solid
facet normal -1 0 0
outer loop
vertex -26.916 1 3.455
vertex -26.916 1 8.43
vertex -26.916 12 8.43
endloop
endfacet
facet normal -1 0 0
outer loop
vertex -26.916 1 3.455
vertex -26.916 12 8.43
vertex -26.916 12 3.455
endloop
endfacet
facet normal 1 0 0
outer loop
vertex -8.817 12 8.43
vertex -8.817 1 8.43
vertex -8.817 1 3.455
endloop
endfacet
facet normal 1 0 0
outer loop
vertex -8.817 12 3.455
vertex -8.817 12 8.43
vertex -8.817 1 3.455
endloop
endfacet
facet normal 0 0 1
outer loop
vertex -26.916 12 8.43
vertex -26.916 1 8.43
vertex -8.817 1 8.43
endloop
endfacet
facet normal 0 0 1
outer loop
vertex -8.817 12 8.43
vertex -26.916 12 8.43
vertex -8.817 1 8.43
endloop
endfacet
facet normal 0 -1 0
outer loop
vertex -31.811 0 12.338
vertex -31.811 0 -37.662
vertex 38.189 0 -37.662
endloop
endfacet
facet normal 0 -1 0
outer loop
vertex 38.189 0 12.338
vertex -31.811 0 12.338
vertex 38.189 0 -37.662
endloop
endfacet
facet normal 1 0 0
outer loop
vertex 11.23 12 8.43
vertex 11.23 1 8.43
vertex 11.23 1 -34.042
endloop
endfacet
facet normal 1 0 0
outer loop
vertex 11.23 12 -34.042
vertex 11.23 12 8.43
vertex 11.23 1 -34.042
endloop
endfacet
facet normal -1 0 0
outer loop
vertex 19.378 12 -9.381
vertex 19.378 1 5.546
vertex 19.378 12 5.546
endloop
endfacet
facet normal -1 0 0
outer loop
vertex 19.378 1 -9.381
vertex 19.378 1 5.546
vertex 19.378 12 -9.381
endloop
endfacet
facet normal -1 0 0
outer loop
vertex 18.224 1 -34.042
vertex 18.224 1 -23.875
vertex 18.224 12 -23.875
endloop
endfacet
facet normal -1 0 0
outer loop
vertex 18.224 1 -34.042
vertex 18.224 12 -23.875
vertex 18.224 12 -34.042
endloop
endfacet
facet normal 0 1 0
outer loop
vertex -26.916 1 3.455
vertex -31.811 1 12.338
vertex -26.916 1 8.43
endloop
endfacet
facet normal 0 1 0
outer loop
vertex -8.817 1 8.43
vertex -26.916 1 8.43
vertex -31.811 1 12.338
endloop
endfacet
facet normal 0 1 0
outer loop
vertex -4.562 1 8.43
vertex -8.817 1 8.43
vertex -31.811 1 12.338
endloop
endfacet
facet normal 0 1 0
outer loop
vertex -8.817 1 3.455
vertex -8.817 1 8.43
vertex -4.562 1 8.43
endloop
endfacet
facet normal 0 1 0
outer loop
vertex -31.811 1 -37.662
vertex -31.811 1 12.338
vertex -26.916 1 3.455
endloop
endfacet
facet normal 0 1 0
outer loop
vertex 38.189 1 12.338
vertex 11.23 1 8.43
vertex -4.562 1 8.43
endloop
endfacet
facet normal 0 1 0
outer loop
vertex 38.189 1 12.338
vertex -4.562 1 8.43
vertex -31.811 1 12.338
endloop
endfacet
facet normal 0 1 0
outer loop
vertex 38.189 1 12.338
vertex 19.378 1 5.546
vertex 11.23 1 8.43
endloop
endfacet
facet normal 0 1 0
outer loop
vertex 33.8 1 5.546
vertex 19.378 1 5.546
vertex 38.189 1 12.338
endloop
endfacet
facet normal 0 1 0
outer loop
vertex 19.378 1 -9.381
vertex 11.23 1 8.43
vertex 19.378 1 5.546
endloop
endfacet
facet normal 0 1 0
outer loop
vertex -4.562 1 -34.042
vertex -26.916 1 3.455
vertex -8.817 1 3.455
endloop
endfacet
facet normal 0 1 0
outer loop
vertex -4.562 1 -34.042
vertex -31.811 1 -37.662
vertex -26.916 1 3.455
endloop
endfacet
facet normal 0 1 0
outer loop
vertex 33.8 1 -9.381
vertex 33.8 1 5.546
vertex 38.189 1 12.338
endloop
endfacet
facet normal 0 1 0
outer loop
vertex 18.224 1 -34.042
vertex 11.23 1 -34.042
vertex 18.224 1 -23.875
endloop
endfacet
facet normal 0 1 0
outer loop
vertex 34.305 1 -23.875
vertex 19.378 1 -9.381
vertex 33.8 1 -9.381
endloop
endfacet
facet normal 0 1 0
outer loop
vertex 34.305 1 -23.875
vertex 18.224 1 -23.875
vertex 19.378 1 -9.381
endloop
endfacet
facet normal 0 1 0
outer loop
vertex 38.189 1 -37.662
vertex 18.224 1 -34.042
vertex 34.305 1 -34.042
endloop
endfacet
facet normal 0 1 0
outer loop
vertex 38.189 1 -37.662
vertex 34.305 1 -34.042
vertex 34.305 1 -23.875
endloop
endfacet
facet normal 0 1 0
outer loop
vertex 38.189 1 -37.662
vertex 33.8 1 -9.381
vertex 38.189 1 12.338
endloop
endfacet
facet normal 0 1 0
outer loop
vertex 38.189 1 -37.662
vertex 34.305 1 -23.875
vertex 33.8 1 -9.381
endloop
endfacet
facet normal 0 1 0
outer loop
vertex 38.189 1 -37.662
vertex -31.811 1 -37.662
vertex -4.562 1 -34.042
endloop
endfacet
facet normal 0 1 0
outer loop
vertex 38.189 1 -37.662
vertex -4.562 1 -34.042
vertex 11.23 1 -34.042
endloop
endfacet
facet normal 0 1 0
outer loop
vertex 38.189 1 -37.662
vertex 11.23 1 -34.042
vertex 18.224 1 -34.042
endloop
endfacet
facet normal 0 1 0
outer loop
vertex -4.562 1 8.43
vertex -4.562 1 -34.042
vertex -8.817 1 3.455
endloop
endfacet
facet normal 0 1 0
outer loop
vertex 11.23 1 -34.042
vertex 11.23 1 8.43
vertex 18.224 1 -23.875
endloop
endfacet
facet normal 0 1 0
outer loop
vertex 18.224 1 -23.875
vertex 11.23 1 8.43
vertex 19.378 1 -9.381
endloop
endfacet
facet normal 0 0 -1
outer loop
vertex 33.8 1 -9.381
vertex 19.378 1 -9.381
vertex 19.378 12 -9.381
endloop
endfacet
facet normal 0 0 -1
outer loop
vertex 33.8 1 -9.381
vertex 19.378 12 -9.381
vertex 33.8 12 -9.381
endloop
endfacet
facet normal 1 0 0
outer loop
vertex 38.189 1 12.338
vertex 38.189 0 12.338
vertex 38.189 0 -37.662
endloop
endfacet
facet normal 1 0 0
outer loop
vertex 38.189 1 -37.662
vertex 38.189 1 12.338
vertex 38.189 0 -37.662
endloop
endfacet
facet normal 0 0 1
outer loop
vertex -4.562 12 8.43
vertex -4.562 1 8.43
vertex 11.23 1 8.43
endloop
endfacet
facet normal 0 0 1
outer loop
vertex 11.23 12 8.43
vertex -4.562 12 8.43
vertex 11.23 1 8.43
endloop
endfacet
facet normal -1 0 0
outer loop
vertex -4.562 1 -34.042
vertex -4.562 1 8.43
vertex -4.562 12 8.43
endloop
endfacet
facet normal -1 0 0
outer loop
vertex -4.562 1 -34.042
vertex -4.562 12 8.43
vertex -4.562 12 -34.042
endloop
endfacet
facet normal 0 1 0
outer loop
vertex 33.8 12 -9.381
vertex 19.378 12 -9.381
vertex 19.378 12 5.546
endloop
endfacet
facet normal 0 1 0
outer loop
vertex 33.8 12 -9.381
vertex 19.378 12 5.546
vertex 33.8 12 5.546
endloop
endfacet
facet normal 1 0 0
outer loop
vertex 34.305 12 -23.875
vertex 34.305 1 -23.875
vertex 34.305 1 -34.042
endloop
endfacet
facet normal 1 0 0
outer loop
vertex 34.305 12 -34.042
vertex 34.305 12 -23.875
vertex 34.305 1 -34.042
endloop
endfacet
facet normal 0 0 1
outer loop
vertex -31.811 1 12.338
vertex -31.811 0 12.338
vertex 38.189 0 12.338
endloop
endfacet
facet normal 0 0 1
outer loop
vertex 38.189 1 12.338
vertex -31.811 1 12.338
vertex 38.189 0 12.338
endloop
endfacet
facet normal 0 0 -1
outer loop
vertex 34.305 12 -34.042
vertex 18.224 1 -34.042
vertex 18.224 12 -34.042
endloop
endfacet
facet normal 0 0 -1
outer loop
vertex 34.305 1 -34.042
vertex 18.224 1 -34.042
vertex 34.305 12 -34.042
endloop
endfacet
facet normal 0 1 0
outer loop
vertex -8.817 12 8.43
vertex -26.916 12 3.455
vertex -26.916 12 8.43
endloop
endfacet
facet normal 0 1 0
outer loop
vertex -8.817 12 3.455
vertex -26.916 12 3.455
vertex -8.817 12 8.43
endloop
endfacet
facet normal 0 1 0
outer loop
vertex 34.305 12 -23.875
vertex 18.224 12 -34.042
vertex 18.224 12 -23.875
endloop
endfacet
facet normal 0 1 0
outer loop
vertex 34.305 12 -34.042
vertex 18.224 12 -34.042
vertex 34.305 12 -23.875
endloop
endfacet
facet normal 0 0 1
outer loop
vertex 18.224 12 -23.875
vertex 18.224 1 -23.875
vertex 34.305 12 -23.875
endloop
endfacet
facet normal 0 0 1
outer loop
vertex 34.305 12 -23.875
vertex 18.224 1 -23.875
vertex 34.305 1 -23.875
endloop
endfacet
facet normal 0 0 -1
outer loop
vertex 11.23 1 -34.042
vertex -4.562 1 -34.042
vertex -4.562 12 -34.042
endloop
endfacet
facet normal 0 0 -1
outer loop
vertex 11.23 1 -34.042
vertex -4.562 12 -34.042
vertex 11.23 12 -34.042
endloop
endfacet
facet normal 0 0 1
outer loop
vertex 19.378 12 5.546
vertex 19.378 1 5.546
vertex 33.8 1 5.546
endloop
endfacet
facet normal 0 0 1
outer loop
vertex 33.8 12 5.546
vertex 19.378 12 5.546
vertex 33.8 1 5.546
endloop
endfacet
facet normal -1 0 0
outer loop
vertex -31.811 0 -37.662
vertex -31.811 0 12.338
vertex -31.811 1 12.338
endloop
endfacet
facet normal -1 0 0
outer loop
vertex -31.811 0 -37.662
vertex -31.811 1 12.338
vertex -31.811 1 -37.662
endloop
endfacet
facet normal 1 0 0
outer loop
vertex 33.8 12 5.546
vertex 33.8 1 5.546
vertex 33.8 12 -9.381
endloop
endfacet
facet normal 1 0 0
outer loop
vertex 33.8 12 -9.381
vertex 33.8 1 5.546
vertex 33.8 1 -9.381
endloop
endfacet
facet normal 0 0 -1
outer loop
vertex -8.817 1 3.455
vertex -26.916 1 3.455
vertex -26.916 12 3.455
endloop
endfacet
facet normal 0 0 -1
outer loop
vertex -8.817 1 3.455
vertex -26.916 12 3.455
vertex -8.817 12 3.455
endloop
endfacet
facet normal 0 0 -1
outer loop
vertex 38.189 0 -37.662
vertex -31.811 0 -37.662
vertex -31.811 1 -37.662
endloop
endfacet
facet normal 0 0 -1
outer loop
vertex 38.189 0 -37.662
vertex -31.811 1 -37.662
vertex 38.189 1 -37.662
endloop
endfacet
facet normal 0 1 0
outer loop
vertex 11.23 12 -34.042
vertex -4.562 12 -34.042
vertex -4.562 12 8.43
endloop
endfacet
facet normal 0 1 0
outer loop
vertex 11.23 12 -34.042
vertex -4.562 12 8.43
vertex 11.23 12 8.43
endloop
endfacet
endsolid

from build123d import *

# Parameters (mm, degrees)
SKETCH1_W           = 70
SKETCH1_H           = 50
BOSS_EXTRUDE1_DEPTH = 1
SKETCH2_W           = 15.79200929
SKETCH2_H           = 42.472572931
SKETCH2_W_2         = 16.080447816
SKETCH2_H_2         = 10.167458036
SKETCH2_W_3         = 14.421926292
SKETCH2_H_3         = 14.926693712
SKETCH2_W_4         = 18.099517497
SKETCH2_H_4         = 4.975564571
BOSS_EXTRUDE2_DEPTH = 12


with BuildPart() as part:
    # Sketch1 → Boss-Extrude1 (new body)
    with BuildSketch(Plane(origin=(0, 0, 0), x_dir=(1, 0, 0), z_dir=(0, 1, 0))):
        with Locations((3.189448441, 12.661870504)):
            Rectangle(SKETCH1_W, SKETCH1_H)
    extrude(amount=BOSS_EXTRUDE1_DEPTH)

    # Sketch2 → Boss-Extrude2 (add)
    with BuildSketch(Plane(origin=(0, 0, 0), x_dir=(1, 0, 0), z_dir=(0, 1, 0))):
        with Locations((3.333667704, 12.806089767)):
            Rectangle(SKETCH2_W, SKETCH2_H)
        with Locations((26.264530509, 28.958647214)):
            Rectangle(SKETCH2_W_2, SKETCH2_H_2)
        with Locations((26.58902385, 1.917535416)):
            Rectangle(SKETCH2_W_3, SKETCH2_H_3)
        with Locations((-17.866563946, -5.942414413)):
            Rectangle(SKETCH2_W_4, SKETCH2_H_4)
    extrude(amount=BOSS_EXTRUDE2_DEPTH)


solid = part.part
